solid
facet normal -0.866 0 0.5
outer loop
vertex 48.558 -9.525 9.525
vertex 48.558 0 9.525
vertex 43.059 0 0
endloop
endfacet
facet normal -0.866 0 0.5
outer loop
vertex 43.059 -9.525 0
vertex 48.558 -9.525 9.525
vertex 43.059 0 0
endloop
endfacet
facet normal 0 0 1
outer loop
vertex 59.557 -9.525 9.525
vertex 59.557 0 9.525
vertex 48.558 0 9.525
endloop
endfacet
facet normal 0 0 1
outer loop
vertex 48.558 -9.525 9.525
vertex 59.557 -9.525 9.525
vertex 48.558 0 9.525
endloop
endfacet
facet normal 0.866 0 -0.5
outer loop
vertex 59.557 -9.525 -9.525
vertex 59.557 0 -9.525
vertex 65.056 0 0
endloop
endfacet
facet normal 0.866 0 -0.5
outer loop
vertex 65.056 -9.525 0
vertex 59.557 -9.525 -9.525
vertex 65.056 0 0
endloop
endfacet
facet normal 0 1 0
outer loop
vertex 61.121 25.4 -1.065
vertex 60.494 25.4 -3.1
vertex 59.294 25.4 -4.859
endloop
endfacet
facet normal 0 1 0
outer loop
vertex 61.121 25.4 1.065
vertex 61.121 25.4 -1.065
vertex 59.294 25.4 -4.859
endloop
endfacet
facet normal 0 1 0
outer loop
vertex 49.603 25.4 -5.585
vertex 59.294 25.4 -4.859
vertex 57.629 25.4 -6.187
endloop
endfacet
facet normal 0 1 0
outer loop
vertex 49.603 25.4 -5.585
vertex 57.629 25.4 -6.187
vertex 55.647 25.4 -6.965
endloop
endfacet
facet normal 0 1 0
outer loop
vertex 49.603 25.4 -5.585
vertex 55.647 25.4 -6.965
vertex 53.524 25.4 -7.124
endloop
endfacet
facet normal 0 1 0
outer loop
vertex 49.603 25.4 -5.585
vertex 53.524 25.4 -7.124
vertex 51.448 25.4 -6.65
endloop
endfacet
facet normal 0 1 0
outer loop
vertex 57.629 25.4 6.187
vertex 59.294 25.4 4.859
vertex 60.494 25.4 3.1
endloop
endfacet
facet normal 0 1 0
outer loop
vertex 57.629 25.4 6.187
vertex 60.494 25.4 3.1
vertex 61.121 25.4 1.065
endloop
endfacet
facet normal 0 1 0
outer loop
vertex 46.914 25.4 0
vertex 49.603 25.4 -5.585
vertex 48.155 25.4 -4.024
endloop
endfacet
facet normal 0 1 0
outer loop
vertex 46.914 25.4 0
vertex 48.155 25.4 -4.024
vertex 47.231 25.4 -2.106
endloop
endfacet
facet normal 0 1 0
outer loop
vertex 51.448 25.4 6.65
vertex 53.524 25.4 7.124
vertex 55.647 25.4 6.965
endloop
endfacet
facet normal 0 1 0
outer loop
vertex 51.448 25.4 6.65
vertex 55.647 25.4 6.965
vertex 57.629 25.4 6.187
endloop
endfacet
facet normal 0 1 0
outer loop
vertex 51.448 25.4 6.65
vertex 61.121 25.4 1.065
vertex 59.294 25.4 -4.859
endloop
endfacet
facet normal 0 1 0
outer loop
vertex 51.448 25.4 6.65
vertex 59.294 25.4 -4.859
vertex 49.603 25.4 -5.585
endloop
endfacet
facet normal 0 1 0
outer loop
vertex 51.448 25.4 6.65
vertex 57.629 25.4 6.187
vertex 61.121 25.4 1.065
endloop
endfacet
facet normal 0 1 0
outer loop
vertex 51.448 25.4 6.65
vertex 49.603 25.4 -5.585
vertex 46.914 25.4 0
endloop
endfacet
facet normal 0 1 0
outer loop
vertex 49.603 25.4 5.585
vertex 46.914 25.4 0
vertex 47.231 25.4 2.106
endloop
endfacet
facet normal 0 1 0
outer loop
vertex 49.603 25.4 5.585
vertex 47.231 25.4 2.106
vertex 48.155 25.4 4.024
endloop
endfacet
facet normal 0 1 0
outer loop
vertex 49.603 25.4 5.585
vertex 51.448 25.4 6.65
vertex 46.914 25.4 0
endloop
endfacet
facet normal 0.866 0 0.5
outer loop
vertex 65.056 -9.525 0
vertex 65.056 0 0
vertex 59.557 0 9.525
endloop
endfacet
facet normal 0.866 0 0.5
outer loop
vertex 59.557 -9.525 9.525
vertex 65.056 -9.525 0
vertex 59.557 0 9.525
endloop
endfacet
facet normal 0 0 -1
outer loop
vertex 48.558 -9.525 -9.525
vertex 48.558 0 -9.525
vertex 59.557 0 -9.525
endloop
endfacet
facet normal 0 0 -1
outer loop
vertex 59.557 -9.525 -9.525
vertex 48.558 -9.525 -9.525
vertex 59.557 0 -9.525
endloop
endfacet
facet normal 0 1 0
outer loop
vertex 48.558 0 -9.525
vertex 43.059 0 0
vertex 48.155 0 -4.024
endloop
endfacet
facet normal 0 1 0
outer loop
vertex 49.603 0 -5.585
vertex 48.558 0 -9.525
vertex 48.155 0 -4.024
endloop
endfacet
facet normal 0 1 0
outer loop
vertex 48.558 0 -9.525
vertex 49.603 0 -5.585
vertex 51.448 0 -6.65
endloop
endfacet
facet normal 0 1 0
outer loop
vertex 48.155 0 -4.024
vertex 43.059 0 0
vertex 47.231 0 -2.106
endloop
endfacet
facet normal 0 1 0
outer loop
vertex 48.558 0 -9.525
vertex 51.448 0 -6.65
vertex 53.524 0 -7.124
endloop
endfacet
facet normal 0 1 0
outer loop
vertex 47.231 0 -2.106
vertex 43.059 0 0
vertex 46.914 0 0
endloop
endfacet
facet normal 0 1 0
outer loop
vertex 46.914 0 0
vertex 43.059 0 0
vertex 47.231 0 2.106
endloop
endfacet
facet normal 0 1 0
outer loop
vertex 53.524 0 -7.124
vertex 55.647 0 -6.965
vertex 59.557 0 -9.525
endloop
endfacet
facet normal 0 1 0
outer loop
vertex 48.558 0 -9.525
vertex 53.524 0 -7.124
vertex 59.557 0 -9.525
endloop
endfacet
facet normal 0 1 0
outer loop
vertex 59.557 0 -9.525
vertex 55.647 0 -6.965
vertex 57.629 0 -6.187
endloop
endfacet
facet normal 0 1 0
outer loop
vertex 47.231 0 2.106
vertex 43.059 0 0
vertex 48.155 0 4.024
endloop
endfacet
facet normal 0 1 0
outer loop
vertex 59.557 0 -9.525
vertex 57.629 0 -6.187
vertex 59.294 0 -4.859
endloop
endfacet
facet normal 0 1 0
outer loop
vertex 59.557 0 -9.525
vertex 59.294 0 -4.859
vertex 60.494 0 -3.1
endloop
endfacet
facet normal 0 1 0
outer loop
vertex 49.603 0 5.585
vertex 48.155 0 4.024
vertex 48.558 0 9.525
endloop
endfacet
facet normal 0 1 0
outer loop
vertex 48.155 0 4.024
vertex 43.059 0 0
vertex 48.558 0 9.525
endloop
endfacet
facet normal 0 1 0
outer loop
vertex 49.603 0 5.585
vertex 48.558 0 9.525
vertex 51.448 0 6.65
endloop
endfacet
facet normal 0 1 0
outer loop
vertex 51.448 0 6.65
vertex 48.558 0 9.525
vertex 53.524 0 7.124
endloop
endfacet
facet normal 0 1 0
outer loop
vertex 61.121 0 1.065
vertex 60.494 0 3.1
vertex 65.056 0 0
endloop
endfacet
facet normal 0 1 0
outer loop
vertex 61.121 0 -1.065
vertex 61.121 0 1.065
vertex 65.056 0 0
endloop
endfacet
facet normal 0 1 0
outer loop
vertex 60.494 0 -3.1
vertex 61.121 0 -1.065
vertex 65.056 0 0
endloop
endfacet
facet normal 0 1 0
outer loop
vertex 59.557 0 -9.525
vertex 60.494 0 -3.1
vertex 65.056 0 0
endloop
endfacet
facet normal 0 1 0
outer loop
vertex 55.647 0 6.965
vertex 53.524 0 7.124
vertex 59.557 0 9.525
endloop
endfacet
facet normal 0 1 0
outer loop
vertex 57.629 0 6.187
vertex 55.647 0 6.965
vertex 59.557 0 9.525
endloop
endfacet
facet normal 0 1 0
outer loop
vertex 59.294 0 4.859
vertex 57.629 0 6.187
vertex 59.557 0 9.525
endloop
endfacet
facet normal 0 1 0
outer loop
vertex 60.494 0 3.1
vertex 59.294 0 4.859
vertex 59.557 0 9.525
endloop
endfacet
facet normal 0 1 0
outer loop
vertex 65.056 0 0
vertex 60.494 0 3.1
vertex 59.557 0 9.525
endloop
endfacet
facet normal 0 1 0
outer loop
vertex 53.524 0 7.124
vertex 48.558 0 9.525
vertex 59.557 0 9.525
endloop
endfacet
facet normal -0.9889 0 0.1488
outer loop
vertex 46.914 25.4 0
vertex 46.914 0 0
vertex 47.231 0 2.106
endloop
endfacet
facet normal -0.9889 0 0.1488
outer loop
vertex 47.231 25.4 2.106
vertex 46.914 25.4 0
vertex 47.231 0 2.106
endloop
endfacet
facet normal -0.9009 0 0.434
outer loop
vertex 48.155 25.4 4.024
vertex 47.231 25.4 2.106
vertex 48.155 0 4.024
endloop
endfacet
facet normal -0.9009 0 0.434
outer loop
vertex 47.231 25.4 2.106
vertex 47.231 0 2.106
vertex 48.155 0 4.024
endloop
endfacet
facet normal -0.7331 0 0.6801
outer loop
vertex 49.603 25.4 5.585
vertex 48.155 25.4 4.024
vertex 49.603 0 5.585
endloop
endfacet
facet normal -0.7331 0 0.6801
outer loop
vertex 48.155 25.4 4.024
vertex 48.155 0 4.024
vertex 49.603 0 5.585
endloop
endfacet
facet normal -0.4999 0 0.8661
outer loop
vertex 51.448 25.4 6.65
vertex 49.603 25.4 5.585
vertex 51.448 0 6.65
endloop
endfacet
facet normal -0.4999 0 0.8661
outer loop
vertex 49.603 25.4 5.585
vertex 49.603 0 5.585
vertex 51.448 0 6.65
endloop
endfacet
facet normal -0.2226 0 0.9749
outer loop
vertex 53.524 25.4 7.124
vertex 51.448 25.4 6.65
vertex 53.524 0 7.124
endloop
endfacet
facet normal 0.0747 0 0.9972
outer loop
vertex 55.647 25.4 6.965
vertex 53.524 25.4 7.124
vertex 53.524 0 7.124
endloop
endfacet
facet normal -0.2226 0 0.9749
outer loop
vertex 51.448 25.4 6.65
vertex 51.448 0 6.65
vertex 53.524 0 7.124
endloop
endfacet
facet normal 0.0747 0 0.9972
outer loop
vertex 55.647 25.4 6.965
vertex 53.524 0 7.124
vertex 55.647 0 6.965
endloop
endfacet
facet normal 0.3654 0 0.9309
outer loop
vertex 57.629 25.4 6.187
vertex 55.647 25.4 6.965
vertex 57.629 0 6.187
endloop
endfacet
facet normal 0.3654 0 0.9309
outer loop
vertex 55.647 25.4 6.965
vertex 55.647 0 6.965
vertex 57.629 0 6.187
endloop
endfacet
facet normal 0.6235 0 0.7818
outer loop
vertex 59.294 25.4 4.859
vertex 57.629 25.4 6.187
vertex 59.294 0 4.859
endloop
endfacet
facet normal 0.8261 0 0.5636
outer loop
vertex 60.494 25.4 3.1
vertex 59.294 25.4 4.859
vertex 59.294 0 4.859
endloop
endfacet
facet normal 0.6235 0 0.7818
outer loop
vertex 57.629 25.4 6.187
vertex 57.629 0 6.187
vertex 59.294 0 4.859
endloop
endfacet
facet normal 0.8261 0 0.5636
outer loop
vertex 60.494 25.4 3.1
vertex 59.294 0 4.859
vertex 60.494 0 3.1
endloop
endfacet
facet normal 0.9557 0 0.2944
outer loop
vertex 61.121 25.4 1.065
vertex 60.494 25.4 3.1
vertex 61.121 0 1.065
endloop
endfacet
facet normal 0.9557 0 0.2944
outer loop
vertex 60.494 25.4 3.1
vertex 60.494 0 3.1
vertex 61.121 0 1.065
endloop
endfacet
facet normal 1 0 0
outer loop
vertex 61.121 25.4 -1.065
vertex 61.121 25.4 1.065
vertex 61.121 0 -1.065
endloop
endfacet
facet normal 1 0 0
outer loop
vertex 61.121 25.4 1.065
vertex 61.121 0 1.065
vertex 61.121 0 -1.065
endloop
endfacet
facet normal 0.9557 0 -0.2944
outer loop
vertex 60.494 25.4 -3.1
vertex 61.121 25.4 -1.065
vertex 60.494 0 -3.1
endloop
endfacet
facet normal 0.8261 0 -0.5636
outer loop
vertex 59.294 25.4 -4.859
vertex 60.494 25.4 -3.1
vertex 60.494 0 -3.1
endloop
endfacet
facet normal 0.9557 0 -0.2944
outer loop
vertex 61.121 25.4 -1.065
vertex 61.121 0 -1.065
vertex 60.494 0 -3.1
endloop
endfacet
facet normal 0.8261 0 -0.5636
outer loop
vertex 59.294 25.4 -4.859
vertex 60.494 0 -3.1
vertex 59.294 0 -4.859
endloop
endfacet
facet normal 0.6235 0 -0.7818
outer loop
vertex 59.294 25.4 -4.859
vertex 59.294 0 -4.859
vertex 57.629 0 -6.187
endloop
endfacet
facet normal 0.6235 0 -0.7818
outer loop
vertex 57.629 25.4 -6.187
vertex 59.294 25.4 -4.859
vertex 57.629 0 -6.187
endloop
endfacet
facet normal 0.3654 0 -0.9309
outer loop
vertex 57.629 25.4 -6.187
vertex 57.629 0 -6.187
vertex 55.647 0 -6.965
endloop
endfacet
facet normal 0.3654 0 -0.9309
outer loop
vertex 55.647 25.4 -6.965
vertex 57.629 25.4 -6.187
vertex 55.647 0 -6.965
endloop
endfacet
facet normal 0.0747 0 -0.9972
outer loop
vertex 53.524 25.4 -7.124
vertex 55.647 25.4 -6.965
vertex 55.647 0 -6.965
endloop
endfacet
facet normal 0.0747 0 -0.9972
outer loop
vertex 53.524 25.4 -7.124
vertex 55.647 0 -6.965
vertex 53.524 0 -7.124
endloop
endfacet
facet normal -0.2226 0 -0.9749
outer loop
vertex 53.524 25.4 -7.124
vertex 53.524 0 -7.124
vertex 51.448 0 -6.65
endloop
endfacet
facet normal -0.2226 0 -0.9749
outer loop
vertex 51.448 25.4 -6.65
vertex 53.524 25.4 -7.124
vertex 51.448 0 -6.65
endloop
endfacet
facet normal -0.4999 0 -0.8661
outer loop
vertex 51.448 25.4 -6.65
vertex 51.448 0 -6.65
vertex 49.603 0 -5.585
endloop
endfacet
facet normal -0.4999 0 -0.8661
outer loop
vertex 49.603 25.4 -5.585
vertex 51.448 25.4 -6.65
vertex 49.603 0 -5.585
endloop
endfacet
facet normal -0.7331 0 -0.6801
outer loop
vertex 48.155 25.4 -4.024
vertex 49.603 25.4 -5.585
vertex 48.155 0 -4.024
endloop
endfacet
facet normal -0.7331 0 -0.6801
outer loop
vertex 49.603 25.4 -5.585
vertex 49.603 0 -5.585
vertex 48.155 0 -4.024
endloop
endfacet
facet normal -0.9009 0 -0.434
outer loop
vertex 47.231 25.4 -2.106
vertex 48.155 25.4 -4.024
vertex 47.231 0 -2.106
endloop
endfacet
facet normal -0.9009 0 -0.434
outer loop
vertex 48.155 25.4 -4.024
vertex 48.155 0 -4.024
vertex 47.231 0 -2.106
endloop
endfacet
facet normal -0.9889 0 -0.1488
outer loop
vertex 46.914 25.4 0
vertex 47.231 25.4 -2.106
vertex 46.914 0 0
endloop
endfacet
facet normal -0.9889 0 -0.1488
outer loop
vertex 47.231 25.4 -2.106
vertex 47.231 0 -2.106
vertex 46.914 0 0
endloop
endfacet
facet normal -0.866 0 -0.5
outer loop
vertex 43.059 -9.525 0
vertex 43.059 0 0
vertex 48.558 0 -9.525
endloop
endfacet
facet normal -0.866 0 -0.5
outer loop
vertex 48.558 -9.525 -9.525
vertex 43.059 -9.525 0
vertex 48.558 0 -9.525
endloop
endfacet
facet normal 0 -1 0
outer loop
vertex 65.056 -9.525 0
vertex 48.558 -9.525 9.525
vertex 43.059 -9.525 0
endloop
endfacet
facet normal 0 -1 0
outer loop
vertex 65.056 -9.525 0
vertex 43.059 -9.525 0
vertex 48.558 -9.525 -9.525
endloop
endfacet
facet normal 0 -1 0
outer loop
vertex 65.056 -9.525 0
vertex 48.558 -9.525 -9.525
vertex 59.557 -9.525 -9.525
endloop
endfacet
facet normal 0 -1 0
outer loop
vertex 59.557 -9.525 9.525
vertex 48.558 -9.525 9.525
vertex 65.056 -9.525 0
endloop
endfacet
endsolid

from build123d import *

# Parameters (mm, degrees)
F1_DEPTH = 9.525
F2_R     = 7.14375
F3_DEPTH = 25.4


with BuildPart() as f1:
    # F0 (on Front) → F1 (new body)
    with BuildSketch(Plane.XZ):
        Polygon((59.556728, 9.525), (48.558205, 9.525), (43.058944, 0), (48.558205, -9.525), (59.556728, -9.525), (65.055989, 0), align=None)
    extrude(amount=F1_DEPTH)

    # F2 (on face) → F3 (join)
    with BuildSketch(Plane(origin=(0, 0, 0), x_dir=(-1, 0, 0), z_dir=(0, 1, 0))):
        with Locations((-54.057466, 0)):
            Circle(F2_R)
    extrude(amount=F3_DEPTH)


solid = f1.part
